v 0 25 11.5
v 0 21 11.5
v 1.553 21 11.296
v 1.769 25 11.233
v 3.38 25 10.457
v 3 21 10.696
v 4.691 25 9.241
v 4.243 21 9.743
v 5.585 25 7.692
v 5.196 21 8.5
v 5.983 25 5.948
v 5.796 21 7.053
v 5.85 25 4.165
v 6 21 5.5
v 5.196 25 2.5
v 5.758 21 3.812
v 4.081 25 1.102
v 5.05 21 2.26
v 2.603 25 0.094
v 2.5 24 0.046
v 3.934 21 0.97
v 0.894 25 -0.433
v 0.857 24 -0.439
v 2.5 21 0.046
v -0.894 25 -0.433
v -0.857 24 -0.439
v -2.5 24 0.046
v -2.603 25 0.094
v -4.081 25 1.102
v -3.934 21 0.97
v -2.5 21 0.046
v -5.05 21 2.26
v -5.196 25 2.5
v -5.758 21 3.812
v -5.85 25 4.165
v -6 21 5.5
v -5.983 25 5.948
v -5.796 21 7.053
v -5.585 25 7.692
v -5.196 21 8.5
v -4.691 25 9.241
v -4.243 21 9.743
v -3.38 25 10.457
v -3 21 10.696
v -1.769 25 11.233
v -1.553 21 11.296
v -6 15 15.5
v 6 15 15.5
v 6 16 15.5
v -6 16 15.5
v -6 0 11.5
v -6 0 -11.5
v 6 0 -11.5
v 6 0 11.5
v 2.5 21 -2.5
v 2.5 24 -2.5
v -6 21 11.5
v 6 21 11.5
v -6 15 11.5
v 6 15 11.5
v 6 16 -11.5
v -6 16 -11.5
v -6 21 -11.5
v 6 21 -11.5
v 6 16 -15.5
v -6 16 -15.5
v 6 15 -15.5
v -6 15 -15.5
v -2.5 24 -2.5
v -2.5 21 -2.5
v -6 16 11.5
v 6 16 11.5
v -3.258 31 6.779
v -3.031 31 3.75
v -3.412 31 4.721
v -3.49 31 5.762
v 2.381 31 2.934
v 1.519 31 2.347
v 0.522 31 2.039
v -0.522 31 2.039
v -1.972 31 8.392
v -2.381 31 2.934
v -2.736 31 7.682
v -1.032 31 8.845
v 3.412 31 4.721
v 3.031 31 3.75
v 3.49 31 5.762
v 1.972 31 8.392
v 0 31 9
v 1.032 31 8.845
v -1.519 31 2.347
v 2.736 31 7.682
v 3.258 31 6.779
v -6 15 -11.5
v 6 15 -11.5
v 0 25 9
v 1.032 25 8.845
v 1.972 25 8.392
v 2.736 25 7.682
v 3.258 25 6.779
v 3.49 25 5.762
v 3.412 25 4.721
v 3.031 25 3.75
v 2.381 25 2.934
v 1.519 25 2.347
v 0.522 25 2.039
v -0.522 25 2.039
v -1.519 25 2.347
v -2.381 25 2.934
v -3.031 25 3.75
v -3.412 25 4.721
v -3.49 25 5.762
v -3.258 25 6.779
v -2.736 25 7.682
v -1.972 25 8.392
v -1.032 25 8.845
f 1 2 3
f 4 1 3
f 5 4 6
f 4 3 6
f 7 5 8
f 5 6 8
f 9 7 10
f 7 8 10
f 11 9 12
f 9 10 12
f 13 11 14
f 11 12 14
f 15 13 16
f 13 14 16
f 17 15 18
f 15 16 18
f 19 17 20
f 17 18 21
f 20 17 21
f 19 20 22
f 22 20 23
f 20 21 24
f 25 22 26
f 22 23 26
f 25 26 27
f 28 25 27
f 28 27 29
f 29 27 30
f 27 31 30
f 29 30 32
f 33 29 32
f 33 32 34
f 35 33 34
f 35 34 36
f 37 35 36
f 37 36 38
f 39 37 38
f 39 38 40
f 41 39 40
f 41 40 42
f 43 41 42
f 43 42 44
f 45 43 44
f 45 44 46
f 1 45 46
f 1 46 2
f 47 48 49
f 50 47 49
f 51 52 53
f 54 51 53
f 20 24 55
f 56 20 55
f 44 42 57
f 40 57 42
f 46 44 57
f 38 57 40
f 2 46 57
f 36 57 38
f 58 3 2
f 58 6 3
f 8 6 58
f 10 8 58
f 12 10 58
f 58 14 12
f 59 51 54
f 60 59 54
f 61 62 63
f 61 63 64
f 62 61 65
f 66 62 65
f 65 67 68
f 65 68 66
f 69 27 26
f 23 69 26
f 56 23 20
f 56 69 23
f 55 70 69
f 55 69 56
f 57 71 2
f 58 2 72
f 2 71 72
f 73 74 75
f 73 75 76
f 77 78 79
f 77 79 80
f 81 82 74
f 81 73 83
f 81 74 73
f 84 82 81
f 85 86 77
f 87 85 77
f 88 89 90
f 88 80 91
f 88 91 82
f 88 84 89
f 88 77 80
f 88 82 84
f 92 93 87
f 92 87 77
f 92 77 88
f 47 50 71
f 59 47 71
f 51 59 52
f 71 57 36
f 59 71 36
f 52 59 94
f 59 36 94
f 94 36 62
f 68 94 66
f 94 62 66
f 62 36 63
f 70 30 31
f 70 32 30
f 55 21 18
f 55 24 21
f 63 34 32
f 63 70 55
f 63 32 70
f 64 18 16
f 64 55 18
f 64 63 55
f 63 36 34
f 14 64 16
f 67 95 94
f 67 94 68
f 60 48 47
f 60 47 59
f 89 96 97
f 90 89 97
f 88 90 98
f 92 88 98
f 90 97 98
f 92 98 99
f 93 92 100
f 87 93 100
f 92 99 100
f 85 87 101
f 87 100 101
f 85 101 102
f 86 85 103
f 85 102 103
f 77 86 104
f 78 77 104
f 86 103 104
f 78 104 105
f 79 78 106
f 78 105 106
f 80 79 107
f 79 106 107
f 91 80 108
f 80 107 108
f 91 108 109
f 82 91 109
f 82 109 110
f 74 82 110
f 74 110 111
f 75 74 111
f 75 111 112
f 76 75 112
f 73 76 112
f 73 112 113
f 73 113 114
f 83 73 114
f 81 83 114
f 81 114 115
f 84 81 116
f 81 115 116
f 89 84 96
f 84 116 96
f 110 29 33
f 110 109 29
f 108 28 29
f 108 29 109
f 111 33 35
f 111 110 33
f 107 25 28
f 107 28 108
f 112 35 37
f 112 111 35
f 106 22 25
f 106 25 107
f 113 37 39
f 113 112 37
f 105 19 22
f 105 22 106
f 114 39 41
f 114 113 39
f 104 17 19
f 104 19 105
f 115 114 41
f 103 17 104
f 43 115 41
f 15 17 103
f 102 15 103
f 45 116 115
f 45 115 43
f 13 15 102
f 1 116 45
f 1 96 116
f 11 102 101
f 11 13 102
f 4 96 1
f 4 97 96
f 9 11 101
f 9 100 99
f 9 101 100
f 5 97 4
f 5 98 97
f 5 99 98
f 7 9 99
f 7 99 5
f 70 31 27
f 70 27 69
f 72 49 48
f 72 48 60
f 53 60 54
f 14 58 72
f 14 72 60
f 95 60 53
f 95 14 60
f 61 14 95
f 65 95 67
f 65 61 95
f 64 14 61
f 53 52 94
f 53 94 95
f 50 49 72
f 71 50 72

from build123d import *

# Parameters (mm, degrees)
SKETCH1_W           = 12
SKETCH1_H           = 23
BOSS_EXTRUDE1_DEPTH = 21
SKETCH2_W           = 31
SKETCH2_H           = 1
BOSS_EXTRUDE2_DEPTH = 12
SKETCH3_R           = 6
BOSS_EXTRUDE3_DEPTH = 4
SKETCH4_W           = 5
SKETCH4_H           = 8
BOSS_EXTRUDE4_DEPTH = 3
SKETCH5_R           = 3.5
BOSS_EXTRUDE5_DEPTH = 6


with BuildPart() as part:
    # Sketch1 → Boss-Extrude1 (new body)
    with BuildSketch(Plane(origin=(0, 0, 0), x_dir=(1, 0, 0), z_dir=(0, 1, 0))):
        Rectangle(SKETCH1_W, SKETCH1_H)
    extrude(amount=BOSS_EXTRUDE1_DEPTH)

    # Sketch2 → Boss-Extrude2 (add)
    with BuildSketch(Plane(origin=(6, 0, 0), x_dir=(0, 0, -1), z_dir=(1, 0, 0))):
        with Locations((0, 15.5)):
            Rectangle(SKETCH2_W, SKETCH2_H)
    extrude(amount=-BOSS_EXTRUDE2_DEPTH)

    # Sketch3 → Boss-Extrude3 (add)
    with BuildSketch(Plane(origin=(0, 21, 0), x_dir=(1, 0, 0), z_dir=(0, 1, 0))):
        with Locations(Location((0, -5.5, 0), (0, 0, 270))):
            Circle(SKETCH3_R)
    extrude(amount=BOSS_EXTRUDE3_DEPTH)

    # Sketch4 → Boss-Extrude4 (add)
    with BuildSketch(Plane(origin=(0, 21, 0), x_dir=(1, 0, 0), z_dir=(0, 1, 0))):
        with Locations((0, -1.5)):
            Rectangle(SKETCH4_W, SKETCH4_H)
    extrude(amount=BOSS_EXTRUDE4_DEPTH)

    # Sketch5 → Boss-Extrude5 (add)
    with BuildSketch(Plane(origin=(0, 25, 0), x_dir=(1, 0, 0), z_dir=(0, 1, 0))):
        with Locations(Location((0, -5.5, 0), (0, 0, 270))):
            Circle(SKETCH5_R)
    extrude(amount=BOSS_EXTRUDE5_DEPTH)


solid = part.part
